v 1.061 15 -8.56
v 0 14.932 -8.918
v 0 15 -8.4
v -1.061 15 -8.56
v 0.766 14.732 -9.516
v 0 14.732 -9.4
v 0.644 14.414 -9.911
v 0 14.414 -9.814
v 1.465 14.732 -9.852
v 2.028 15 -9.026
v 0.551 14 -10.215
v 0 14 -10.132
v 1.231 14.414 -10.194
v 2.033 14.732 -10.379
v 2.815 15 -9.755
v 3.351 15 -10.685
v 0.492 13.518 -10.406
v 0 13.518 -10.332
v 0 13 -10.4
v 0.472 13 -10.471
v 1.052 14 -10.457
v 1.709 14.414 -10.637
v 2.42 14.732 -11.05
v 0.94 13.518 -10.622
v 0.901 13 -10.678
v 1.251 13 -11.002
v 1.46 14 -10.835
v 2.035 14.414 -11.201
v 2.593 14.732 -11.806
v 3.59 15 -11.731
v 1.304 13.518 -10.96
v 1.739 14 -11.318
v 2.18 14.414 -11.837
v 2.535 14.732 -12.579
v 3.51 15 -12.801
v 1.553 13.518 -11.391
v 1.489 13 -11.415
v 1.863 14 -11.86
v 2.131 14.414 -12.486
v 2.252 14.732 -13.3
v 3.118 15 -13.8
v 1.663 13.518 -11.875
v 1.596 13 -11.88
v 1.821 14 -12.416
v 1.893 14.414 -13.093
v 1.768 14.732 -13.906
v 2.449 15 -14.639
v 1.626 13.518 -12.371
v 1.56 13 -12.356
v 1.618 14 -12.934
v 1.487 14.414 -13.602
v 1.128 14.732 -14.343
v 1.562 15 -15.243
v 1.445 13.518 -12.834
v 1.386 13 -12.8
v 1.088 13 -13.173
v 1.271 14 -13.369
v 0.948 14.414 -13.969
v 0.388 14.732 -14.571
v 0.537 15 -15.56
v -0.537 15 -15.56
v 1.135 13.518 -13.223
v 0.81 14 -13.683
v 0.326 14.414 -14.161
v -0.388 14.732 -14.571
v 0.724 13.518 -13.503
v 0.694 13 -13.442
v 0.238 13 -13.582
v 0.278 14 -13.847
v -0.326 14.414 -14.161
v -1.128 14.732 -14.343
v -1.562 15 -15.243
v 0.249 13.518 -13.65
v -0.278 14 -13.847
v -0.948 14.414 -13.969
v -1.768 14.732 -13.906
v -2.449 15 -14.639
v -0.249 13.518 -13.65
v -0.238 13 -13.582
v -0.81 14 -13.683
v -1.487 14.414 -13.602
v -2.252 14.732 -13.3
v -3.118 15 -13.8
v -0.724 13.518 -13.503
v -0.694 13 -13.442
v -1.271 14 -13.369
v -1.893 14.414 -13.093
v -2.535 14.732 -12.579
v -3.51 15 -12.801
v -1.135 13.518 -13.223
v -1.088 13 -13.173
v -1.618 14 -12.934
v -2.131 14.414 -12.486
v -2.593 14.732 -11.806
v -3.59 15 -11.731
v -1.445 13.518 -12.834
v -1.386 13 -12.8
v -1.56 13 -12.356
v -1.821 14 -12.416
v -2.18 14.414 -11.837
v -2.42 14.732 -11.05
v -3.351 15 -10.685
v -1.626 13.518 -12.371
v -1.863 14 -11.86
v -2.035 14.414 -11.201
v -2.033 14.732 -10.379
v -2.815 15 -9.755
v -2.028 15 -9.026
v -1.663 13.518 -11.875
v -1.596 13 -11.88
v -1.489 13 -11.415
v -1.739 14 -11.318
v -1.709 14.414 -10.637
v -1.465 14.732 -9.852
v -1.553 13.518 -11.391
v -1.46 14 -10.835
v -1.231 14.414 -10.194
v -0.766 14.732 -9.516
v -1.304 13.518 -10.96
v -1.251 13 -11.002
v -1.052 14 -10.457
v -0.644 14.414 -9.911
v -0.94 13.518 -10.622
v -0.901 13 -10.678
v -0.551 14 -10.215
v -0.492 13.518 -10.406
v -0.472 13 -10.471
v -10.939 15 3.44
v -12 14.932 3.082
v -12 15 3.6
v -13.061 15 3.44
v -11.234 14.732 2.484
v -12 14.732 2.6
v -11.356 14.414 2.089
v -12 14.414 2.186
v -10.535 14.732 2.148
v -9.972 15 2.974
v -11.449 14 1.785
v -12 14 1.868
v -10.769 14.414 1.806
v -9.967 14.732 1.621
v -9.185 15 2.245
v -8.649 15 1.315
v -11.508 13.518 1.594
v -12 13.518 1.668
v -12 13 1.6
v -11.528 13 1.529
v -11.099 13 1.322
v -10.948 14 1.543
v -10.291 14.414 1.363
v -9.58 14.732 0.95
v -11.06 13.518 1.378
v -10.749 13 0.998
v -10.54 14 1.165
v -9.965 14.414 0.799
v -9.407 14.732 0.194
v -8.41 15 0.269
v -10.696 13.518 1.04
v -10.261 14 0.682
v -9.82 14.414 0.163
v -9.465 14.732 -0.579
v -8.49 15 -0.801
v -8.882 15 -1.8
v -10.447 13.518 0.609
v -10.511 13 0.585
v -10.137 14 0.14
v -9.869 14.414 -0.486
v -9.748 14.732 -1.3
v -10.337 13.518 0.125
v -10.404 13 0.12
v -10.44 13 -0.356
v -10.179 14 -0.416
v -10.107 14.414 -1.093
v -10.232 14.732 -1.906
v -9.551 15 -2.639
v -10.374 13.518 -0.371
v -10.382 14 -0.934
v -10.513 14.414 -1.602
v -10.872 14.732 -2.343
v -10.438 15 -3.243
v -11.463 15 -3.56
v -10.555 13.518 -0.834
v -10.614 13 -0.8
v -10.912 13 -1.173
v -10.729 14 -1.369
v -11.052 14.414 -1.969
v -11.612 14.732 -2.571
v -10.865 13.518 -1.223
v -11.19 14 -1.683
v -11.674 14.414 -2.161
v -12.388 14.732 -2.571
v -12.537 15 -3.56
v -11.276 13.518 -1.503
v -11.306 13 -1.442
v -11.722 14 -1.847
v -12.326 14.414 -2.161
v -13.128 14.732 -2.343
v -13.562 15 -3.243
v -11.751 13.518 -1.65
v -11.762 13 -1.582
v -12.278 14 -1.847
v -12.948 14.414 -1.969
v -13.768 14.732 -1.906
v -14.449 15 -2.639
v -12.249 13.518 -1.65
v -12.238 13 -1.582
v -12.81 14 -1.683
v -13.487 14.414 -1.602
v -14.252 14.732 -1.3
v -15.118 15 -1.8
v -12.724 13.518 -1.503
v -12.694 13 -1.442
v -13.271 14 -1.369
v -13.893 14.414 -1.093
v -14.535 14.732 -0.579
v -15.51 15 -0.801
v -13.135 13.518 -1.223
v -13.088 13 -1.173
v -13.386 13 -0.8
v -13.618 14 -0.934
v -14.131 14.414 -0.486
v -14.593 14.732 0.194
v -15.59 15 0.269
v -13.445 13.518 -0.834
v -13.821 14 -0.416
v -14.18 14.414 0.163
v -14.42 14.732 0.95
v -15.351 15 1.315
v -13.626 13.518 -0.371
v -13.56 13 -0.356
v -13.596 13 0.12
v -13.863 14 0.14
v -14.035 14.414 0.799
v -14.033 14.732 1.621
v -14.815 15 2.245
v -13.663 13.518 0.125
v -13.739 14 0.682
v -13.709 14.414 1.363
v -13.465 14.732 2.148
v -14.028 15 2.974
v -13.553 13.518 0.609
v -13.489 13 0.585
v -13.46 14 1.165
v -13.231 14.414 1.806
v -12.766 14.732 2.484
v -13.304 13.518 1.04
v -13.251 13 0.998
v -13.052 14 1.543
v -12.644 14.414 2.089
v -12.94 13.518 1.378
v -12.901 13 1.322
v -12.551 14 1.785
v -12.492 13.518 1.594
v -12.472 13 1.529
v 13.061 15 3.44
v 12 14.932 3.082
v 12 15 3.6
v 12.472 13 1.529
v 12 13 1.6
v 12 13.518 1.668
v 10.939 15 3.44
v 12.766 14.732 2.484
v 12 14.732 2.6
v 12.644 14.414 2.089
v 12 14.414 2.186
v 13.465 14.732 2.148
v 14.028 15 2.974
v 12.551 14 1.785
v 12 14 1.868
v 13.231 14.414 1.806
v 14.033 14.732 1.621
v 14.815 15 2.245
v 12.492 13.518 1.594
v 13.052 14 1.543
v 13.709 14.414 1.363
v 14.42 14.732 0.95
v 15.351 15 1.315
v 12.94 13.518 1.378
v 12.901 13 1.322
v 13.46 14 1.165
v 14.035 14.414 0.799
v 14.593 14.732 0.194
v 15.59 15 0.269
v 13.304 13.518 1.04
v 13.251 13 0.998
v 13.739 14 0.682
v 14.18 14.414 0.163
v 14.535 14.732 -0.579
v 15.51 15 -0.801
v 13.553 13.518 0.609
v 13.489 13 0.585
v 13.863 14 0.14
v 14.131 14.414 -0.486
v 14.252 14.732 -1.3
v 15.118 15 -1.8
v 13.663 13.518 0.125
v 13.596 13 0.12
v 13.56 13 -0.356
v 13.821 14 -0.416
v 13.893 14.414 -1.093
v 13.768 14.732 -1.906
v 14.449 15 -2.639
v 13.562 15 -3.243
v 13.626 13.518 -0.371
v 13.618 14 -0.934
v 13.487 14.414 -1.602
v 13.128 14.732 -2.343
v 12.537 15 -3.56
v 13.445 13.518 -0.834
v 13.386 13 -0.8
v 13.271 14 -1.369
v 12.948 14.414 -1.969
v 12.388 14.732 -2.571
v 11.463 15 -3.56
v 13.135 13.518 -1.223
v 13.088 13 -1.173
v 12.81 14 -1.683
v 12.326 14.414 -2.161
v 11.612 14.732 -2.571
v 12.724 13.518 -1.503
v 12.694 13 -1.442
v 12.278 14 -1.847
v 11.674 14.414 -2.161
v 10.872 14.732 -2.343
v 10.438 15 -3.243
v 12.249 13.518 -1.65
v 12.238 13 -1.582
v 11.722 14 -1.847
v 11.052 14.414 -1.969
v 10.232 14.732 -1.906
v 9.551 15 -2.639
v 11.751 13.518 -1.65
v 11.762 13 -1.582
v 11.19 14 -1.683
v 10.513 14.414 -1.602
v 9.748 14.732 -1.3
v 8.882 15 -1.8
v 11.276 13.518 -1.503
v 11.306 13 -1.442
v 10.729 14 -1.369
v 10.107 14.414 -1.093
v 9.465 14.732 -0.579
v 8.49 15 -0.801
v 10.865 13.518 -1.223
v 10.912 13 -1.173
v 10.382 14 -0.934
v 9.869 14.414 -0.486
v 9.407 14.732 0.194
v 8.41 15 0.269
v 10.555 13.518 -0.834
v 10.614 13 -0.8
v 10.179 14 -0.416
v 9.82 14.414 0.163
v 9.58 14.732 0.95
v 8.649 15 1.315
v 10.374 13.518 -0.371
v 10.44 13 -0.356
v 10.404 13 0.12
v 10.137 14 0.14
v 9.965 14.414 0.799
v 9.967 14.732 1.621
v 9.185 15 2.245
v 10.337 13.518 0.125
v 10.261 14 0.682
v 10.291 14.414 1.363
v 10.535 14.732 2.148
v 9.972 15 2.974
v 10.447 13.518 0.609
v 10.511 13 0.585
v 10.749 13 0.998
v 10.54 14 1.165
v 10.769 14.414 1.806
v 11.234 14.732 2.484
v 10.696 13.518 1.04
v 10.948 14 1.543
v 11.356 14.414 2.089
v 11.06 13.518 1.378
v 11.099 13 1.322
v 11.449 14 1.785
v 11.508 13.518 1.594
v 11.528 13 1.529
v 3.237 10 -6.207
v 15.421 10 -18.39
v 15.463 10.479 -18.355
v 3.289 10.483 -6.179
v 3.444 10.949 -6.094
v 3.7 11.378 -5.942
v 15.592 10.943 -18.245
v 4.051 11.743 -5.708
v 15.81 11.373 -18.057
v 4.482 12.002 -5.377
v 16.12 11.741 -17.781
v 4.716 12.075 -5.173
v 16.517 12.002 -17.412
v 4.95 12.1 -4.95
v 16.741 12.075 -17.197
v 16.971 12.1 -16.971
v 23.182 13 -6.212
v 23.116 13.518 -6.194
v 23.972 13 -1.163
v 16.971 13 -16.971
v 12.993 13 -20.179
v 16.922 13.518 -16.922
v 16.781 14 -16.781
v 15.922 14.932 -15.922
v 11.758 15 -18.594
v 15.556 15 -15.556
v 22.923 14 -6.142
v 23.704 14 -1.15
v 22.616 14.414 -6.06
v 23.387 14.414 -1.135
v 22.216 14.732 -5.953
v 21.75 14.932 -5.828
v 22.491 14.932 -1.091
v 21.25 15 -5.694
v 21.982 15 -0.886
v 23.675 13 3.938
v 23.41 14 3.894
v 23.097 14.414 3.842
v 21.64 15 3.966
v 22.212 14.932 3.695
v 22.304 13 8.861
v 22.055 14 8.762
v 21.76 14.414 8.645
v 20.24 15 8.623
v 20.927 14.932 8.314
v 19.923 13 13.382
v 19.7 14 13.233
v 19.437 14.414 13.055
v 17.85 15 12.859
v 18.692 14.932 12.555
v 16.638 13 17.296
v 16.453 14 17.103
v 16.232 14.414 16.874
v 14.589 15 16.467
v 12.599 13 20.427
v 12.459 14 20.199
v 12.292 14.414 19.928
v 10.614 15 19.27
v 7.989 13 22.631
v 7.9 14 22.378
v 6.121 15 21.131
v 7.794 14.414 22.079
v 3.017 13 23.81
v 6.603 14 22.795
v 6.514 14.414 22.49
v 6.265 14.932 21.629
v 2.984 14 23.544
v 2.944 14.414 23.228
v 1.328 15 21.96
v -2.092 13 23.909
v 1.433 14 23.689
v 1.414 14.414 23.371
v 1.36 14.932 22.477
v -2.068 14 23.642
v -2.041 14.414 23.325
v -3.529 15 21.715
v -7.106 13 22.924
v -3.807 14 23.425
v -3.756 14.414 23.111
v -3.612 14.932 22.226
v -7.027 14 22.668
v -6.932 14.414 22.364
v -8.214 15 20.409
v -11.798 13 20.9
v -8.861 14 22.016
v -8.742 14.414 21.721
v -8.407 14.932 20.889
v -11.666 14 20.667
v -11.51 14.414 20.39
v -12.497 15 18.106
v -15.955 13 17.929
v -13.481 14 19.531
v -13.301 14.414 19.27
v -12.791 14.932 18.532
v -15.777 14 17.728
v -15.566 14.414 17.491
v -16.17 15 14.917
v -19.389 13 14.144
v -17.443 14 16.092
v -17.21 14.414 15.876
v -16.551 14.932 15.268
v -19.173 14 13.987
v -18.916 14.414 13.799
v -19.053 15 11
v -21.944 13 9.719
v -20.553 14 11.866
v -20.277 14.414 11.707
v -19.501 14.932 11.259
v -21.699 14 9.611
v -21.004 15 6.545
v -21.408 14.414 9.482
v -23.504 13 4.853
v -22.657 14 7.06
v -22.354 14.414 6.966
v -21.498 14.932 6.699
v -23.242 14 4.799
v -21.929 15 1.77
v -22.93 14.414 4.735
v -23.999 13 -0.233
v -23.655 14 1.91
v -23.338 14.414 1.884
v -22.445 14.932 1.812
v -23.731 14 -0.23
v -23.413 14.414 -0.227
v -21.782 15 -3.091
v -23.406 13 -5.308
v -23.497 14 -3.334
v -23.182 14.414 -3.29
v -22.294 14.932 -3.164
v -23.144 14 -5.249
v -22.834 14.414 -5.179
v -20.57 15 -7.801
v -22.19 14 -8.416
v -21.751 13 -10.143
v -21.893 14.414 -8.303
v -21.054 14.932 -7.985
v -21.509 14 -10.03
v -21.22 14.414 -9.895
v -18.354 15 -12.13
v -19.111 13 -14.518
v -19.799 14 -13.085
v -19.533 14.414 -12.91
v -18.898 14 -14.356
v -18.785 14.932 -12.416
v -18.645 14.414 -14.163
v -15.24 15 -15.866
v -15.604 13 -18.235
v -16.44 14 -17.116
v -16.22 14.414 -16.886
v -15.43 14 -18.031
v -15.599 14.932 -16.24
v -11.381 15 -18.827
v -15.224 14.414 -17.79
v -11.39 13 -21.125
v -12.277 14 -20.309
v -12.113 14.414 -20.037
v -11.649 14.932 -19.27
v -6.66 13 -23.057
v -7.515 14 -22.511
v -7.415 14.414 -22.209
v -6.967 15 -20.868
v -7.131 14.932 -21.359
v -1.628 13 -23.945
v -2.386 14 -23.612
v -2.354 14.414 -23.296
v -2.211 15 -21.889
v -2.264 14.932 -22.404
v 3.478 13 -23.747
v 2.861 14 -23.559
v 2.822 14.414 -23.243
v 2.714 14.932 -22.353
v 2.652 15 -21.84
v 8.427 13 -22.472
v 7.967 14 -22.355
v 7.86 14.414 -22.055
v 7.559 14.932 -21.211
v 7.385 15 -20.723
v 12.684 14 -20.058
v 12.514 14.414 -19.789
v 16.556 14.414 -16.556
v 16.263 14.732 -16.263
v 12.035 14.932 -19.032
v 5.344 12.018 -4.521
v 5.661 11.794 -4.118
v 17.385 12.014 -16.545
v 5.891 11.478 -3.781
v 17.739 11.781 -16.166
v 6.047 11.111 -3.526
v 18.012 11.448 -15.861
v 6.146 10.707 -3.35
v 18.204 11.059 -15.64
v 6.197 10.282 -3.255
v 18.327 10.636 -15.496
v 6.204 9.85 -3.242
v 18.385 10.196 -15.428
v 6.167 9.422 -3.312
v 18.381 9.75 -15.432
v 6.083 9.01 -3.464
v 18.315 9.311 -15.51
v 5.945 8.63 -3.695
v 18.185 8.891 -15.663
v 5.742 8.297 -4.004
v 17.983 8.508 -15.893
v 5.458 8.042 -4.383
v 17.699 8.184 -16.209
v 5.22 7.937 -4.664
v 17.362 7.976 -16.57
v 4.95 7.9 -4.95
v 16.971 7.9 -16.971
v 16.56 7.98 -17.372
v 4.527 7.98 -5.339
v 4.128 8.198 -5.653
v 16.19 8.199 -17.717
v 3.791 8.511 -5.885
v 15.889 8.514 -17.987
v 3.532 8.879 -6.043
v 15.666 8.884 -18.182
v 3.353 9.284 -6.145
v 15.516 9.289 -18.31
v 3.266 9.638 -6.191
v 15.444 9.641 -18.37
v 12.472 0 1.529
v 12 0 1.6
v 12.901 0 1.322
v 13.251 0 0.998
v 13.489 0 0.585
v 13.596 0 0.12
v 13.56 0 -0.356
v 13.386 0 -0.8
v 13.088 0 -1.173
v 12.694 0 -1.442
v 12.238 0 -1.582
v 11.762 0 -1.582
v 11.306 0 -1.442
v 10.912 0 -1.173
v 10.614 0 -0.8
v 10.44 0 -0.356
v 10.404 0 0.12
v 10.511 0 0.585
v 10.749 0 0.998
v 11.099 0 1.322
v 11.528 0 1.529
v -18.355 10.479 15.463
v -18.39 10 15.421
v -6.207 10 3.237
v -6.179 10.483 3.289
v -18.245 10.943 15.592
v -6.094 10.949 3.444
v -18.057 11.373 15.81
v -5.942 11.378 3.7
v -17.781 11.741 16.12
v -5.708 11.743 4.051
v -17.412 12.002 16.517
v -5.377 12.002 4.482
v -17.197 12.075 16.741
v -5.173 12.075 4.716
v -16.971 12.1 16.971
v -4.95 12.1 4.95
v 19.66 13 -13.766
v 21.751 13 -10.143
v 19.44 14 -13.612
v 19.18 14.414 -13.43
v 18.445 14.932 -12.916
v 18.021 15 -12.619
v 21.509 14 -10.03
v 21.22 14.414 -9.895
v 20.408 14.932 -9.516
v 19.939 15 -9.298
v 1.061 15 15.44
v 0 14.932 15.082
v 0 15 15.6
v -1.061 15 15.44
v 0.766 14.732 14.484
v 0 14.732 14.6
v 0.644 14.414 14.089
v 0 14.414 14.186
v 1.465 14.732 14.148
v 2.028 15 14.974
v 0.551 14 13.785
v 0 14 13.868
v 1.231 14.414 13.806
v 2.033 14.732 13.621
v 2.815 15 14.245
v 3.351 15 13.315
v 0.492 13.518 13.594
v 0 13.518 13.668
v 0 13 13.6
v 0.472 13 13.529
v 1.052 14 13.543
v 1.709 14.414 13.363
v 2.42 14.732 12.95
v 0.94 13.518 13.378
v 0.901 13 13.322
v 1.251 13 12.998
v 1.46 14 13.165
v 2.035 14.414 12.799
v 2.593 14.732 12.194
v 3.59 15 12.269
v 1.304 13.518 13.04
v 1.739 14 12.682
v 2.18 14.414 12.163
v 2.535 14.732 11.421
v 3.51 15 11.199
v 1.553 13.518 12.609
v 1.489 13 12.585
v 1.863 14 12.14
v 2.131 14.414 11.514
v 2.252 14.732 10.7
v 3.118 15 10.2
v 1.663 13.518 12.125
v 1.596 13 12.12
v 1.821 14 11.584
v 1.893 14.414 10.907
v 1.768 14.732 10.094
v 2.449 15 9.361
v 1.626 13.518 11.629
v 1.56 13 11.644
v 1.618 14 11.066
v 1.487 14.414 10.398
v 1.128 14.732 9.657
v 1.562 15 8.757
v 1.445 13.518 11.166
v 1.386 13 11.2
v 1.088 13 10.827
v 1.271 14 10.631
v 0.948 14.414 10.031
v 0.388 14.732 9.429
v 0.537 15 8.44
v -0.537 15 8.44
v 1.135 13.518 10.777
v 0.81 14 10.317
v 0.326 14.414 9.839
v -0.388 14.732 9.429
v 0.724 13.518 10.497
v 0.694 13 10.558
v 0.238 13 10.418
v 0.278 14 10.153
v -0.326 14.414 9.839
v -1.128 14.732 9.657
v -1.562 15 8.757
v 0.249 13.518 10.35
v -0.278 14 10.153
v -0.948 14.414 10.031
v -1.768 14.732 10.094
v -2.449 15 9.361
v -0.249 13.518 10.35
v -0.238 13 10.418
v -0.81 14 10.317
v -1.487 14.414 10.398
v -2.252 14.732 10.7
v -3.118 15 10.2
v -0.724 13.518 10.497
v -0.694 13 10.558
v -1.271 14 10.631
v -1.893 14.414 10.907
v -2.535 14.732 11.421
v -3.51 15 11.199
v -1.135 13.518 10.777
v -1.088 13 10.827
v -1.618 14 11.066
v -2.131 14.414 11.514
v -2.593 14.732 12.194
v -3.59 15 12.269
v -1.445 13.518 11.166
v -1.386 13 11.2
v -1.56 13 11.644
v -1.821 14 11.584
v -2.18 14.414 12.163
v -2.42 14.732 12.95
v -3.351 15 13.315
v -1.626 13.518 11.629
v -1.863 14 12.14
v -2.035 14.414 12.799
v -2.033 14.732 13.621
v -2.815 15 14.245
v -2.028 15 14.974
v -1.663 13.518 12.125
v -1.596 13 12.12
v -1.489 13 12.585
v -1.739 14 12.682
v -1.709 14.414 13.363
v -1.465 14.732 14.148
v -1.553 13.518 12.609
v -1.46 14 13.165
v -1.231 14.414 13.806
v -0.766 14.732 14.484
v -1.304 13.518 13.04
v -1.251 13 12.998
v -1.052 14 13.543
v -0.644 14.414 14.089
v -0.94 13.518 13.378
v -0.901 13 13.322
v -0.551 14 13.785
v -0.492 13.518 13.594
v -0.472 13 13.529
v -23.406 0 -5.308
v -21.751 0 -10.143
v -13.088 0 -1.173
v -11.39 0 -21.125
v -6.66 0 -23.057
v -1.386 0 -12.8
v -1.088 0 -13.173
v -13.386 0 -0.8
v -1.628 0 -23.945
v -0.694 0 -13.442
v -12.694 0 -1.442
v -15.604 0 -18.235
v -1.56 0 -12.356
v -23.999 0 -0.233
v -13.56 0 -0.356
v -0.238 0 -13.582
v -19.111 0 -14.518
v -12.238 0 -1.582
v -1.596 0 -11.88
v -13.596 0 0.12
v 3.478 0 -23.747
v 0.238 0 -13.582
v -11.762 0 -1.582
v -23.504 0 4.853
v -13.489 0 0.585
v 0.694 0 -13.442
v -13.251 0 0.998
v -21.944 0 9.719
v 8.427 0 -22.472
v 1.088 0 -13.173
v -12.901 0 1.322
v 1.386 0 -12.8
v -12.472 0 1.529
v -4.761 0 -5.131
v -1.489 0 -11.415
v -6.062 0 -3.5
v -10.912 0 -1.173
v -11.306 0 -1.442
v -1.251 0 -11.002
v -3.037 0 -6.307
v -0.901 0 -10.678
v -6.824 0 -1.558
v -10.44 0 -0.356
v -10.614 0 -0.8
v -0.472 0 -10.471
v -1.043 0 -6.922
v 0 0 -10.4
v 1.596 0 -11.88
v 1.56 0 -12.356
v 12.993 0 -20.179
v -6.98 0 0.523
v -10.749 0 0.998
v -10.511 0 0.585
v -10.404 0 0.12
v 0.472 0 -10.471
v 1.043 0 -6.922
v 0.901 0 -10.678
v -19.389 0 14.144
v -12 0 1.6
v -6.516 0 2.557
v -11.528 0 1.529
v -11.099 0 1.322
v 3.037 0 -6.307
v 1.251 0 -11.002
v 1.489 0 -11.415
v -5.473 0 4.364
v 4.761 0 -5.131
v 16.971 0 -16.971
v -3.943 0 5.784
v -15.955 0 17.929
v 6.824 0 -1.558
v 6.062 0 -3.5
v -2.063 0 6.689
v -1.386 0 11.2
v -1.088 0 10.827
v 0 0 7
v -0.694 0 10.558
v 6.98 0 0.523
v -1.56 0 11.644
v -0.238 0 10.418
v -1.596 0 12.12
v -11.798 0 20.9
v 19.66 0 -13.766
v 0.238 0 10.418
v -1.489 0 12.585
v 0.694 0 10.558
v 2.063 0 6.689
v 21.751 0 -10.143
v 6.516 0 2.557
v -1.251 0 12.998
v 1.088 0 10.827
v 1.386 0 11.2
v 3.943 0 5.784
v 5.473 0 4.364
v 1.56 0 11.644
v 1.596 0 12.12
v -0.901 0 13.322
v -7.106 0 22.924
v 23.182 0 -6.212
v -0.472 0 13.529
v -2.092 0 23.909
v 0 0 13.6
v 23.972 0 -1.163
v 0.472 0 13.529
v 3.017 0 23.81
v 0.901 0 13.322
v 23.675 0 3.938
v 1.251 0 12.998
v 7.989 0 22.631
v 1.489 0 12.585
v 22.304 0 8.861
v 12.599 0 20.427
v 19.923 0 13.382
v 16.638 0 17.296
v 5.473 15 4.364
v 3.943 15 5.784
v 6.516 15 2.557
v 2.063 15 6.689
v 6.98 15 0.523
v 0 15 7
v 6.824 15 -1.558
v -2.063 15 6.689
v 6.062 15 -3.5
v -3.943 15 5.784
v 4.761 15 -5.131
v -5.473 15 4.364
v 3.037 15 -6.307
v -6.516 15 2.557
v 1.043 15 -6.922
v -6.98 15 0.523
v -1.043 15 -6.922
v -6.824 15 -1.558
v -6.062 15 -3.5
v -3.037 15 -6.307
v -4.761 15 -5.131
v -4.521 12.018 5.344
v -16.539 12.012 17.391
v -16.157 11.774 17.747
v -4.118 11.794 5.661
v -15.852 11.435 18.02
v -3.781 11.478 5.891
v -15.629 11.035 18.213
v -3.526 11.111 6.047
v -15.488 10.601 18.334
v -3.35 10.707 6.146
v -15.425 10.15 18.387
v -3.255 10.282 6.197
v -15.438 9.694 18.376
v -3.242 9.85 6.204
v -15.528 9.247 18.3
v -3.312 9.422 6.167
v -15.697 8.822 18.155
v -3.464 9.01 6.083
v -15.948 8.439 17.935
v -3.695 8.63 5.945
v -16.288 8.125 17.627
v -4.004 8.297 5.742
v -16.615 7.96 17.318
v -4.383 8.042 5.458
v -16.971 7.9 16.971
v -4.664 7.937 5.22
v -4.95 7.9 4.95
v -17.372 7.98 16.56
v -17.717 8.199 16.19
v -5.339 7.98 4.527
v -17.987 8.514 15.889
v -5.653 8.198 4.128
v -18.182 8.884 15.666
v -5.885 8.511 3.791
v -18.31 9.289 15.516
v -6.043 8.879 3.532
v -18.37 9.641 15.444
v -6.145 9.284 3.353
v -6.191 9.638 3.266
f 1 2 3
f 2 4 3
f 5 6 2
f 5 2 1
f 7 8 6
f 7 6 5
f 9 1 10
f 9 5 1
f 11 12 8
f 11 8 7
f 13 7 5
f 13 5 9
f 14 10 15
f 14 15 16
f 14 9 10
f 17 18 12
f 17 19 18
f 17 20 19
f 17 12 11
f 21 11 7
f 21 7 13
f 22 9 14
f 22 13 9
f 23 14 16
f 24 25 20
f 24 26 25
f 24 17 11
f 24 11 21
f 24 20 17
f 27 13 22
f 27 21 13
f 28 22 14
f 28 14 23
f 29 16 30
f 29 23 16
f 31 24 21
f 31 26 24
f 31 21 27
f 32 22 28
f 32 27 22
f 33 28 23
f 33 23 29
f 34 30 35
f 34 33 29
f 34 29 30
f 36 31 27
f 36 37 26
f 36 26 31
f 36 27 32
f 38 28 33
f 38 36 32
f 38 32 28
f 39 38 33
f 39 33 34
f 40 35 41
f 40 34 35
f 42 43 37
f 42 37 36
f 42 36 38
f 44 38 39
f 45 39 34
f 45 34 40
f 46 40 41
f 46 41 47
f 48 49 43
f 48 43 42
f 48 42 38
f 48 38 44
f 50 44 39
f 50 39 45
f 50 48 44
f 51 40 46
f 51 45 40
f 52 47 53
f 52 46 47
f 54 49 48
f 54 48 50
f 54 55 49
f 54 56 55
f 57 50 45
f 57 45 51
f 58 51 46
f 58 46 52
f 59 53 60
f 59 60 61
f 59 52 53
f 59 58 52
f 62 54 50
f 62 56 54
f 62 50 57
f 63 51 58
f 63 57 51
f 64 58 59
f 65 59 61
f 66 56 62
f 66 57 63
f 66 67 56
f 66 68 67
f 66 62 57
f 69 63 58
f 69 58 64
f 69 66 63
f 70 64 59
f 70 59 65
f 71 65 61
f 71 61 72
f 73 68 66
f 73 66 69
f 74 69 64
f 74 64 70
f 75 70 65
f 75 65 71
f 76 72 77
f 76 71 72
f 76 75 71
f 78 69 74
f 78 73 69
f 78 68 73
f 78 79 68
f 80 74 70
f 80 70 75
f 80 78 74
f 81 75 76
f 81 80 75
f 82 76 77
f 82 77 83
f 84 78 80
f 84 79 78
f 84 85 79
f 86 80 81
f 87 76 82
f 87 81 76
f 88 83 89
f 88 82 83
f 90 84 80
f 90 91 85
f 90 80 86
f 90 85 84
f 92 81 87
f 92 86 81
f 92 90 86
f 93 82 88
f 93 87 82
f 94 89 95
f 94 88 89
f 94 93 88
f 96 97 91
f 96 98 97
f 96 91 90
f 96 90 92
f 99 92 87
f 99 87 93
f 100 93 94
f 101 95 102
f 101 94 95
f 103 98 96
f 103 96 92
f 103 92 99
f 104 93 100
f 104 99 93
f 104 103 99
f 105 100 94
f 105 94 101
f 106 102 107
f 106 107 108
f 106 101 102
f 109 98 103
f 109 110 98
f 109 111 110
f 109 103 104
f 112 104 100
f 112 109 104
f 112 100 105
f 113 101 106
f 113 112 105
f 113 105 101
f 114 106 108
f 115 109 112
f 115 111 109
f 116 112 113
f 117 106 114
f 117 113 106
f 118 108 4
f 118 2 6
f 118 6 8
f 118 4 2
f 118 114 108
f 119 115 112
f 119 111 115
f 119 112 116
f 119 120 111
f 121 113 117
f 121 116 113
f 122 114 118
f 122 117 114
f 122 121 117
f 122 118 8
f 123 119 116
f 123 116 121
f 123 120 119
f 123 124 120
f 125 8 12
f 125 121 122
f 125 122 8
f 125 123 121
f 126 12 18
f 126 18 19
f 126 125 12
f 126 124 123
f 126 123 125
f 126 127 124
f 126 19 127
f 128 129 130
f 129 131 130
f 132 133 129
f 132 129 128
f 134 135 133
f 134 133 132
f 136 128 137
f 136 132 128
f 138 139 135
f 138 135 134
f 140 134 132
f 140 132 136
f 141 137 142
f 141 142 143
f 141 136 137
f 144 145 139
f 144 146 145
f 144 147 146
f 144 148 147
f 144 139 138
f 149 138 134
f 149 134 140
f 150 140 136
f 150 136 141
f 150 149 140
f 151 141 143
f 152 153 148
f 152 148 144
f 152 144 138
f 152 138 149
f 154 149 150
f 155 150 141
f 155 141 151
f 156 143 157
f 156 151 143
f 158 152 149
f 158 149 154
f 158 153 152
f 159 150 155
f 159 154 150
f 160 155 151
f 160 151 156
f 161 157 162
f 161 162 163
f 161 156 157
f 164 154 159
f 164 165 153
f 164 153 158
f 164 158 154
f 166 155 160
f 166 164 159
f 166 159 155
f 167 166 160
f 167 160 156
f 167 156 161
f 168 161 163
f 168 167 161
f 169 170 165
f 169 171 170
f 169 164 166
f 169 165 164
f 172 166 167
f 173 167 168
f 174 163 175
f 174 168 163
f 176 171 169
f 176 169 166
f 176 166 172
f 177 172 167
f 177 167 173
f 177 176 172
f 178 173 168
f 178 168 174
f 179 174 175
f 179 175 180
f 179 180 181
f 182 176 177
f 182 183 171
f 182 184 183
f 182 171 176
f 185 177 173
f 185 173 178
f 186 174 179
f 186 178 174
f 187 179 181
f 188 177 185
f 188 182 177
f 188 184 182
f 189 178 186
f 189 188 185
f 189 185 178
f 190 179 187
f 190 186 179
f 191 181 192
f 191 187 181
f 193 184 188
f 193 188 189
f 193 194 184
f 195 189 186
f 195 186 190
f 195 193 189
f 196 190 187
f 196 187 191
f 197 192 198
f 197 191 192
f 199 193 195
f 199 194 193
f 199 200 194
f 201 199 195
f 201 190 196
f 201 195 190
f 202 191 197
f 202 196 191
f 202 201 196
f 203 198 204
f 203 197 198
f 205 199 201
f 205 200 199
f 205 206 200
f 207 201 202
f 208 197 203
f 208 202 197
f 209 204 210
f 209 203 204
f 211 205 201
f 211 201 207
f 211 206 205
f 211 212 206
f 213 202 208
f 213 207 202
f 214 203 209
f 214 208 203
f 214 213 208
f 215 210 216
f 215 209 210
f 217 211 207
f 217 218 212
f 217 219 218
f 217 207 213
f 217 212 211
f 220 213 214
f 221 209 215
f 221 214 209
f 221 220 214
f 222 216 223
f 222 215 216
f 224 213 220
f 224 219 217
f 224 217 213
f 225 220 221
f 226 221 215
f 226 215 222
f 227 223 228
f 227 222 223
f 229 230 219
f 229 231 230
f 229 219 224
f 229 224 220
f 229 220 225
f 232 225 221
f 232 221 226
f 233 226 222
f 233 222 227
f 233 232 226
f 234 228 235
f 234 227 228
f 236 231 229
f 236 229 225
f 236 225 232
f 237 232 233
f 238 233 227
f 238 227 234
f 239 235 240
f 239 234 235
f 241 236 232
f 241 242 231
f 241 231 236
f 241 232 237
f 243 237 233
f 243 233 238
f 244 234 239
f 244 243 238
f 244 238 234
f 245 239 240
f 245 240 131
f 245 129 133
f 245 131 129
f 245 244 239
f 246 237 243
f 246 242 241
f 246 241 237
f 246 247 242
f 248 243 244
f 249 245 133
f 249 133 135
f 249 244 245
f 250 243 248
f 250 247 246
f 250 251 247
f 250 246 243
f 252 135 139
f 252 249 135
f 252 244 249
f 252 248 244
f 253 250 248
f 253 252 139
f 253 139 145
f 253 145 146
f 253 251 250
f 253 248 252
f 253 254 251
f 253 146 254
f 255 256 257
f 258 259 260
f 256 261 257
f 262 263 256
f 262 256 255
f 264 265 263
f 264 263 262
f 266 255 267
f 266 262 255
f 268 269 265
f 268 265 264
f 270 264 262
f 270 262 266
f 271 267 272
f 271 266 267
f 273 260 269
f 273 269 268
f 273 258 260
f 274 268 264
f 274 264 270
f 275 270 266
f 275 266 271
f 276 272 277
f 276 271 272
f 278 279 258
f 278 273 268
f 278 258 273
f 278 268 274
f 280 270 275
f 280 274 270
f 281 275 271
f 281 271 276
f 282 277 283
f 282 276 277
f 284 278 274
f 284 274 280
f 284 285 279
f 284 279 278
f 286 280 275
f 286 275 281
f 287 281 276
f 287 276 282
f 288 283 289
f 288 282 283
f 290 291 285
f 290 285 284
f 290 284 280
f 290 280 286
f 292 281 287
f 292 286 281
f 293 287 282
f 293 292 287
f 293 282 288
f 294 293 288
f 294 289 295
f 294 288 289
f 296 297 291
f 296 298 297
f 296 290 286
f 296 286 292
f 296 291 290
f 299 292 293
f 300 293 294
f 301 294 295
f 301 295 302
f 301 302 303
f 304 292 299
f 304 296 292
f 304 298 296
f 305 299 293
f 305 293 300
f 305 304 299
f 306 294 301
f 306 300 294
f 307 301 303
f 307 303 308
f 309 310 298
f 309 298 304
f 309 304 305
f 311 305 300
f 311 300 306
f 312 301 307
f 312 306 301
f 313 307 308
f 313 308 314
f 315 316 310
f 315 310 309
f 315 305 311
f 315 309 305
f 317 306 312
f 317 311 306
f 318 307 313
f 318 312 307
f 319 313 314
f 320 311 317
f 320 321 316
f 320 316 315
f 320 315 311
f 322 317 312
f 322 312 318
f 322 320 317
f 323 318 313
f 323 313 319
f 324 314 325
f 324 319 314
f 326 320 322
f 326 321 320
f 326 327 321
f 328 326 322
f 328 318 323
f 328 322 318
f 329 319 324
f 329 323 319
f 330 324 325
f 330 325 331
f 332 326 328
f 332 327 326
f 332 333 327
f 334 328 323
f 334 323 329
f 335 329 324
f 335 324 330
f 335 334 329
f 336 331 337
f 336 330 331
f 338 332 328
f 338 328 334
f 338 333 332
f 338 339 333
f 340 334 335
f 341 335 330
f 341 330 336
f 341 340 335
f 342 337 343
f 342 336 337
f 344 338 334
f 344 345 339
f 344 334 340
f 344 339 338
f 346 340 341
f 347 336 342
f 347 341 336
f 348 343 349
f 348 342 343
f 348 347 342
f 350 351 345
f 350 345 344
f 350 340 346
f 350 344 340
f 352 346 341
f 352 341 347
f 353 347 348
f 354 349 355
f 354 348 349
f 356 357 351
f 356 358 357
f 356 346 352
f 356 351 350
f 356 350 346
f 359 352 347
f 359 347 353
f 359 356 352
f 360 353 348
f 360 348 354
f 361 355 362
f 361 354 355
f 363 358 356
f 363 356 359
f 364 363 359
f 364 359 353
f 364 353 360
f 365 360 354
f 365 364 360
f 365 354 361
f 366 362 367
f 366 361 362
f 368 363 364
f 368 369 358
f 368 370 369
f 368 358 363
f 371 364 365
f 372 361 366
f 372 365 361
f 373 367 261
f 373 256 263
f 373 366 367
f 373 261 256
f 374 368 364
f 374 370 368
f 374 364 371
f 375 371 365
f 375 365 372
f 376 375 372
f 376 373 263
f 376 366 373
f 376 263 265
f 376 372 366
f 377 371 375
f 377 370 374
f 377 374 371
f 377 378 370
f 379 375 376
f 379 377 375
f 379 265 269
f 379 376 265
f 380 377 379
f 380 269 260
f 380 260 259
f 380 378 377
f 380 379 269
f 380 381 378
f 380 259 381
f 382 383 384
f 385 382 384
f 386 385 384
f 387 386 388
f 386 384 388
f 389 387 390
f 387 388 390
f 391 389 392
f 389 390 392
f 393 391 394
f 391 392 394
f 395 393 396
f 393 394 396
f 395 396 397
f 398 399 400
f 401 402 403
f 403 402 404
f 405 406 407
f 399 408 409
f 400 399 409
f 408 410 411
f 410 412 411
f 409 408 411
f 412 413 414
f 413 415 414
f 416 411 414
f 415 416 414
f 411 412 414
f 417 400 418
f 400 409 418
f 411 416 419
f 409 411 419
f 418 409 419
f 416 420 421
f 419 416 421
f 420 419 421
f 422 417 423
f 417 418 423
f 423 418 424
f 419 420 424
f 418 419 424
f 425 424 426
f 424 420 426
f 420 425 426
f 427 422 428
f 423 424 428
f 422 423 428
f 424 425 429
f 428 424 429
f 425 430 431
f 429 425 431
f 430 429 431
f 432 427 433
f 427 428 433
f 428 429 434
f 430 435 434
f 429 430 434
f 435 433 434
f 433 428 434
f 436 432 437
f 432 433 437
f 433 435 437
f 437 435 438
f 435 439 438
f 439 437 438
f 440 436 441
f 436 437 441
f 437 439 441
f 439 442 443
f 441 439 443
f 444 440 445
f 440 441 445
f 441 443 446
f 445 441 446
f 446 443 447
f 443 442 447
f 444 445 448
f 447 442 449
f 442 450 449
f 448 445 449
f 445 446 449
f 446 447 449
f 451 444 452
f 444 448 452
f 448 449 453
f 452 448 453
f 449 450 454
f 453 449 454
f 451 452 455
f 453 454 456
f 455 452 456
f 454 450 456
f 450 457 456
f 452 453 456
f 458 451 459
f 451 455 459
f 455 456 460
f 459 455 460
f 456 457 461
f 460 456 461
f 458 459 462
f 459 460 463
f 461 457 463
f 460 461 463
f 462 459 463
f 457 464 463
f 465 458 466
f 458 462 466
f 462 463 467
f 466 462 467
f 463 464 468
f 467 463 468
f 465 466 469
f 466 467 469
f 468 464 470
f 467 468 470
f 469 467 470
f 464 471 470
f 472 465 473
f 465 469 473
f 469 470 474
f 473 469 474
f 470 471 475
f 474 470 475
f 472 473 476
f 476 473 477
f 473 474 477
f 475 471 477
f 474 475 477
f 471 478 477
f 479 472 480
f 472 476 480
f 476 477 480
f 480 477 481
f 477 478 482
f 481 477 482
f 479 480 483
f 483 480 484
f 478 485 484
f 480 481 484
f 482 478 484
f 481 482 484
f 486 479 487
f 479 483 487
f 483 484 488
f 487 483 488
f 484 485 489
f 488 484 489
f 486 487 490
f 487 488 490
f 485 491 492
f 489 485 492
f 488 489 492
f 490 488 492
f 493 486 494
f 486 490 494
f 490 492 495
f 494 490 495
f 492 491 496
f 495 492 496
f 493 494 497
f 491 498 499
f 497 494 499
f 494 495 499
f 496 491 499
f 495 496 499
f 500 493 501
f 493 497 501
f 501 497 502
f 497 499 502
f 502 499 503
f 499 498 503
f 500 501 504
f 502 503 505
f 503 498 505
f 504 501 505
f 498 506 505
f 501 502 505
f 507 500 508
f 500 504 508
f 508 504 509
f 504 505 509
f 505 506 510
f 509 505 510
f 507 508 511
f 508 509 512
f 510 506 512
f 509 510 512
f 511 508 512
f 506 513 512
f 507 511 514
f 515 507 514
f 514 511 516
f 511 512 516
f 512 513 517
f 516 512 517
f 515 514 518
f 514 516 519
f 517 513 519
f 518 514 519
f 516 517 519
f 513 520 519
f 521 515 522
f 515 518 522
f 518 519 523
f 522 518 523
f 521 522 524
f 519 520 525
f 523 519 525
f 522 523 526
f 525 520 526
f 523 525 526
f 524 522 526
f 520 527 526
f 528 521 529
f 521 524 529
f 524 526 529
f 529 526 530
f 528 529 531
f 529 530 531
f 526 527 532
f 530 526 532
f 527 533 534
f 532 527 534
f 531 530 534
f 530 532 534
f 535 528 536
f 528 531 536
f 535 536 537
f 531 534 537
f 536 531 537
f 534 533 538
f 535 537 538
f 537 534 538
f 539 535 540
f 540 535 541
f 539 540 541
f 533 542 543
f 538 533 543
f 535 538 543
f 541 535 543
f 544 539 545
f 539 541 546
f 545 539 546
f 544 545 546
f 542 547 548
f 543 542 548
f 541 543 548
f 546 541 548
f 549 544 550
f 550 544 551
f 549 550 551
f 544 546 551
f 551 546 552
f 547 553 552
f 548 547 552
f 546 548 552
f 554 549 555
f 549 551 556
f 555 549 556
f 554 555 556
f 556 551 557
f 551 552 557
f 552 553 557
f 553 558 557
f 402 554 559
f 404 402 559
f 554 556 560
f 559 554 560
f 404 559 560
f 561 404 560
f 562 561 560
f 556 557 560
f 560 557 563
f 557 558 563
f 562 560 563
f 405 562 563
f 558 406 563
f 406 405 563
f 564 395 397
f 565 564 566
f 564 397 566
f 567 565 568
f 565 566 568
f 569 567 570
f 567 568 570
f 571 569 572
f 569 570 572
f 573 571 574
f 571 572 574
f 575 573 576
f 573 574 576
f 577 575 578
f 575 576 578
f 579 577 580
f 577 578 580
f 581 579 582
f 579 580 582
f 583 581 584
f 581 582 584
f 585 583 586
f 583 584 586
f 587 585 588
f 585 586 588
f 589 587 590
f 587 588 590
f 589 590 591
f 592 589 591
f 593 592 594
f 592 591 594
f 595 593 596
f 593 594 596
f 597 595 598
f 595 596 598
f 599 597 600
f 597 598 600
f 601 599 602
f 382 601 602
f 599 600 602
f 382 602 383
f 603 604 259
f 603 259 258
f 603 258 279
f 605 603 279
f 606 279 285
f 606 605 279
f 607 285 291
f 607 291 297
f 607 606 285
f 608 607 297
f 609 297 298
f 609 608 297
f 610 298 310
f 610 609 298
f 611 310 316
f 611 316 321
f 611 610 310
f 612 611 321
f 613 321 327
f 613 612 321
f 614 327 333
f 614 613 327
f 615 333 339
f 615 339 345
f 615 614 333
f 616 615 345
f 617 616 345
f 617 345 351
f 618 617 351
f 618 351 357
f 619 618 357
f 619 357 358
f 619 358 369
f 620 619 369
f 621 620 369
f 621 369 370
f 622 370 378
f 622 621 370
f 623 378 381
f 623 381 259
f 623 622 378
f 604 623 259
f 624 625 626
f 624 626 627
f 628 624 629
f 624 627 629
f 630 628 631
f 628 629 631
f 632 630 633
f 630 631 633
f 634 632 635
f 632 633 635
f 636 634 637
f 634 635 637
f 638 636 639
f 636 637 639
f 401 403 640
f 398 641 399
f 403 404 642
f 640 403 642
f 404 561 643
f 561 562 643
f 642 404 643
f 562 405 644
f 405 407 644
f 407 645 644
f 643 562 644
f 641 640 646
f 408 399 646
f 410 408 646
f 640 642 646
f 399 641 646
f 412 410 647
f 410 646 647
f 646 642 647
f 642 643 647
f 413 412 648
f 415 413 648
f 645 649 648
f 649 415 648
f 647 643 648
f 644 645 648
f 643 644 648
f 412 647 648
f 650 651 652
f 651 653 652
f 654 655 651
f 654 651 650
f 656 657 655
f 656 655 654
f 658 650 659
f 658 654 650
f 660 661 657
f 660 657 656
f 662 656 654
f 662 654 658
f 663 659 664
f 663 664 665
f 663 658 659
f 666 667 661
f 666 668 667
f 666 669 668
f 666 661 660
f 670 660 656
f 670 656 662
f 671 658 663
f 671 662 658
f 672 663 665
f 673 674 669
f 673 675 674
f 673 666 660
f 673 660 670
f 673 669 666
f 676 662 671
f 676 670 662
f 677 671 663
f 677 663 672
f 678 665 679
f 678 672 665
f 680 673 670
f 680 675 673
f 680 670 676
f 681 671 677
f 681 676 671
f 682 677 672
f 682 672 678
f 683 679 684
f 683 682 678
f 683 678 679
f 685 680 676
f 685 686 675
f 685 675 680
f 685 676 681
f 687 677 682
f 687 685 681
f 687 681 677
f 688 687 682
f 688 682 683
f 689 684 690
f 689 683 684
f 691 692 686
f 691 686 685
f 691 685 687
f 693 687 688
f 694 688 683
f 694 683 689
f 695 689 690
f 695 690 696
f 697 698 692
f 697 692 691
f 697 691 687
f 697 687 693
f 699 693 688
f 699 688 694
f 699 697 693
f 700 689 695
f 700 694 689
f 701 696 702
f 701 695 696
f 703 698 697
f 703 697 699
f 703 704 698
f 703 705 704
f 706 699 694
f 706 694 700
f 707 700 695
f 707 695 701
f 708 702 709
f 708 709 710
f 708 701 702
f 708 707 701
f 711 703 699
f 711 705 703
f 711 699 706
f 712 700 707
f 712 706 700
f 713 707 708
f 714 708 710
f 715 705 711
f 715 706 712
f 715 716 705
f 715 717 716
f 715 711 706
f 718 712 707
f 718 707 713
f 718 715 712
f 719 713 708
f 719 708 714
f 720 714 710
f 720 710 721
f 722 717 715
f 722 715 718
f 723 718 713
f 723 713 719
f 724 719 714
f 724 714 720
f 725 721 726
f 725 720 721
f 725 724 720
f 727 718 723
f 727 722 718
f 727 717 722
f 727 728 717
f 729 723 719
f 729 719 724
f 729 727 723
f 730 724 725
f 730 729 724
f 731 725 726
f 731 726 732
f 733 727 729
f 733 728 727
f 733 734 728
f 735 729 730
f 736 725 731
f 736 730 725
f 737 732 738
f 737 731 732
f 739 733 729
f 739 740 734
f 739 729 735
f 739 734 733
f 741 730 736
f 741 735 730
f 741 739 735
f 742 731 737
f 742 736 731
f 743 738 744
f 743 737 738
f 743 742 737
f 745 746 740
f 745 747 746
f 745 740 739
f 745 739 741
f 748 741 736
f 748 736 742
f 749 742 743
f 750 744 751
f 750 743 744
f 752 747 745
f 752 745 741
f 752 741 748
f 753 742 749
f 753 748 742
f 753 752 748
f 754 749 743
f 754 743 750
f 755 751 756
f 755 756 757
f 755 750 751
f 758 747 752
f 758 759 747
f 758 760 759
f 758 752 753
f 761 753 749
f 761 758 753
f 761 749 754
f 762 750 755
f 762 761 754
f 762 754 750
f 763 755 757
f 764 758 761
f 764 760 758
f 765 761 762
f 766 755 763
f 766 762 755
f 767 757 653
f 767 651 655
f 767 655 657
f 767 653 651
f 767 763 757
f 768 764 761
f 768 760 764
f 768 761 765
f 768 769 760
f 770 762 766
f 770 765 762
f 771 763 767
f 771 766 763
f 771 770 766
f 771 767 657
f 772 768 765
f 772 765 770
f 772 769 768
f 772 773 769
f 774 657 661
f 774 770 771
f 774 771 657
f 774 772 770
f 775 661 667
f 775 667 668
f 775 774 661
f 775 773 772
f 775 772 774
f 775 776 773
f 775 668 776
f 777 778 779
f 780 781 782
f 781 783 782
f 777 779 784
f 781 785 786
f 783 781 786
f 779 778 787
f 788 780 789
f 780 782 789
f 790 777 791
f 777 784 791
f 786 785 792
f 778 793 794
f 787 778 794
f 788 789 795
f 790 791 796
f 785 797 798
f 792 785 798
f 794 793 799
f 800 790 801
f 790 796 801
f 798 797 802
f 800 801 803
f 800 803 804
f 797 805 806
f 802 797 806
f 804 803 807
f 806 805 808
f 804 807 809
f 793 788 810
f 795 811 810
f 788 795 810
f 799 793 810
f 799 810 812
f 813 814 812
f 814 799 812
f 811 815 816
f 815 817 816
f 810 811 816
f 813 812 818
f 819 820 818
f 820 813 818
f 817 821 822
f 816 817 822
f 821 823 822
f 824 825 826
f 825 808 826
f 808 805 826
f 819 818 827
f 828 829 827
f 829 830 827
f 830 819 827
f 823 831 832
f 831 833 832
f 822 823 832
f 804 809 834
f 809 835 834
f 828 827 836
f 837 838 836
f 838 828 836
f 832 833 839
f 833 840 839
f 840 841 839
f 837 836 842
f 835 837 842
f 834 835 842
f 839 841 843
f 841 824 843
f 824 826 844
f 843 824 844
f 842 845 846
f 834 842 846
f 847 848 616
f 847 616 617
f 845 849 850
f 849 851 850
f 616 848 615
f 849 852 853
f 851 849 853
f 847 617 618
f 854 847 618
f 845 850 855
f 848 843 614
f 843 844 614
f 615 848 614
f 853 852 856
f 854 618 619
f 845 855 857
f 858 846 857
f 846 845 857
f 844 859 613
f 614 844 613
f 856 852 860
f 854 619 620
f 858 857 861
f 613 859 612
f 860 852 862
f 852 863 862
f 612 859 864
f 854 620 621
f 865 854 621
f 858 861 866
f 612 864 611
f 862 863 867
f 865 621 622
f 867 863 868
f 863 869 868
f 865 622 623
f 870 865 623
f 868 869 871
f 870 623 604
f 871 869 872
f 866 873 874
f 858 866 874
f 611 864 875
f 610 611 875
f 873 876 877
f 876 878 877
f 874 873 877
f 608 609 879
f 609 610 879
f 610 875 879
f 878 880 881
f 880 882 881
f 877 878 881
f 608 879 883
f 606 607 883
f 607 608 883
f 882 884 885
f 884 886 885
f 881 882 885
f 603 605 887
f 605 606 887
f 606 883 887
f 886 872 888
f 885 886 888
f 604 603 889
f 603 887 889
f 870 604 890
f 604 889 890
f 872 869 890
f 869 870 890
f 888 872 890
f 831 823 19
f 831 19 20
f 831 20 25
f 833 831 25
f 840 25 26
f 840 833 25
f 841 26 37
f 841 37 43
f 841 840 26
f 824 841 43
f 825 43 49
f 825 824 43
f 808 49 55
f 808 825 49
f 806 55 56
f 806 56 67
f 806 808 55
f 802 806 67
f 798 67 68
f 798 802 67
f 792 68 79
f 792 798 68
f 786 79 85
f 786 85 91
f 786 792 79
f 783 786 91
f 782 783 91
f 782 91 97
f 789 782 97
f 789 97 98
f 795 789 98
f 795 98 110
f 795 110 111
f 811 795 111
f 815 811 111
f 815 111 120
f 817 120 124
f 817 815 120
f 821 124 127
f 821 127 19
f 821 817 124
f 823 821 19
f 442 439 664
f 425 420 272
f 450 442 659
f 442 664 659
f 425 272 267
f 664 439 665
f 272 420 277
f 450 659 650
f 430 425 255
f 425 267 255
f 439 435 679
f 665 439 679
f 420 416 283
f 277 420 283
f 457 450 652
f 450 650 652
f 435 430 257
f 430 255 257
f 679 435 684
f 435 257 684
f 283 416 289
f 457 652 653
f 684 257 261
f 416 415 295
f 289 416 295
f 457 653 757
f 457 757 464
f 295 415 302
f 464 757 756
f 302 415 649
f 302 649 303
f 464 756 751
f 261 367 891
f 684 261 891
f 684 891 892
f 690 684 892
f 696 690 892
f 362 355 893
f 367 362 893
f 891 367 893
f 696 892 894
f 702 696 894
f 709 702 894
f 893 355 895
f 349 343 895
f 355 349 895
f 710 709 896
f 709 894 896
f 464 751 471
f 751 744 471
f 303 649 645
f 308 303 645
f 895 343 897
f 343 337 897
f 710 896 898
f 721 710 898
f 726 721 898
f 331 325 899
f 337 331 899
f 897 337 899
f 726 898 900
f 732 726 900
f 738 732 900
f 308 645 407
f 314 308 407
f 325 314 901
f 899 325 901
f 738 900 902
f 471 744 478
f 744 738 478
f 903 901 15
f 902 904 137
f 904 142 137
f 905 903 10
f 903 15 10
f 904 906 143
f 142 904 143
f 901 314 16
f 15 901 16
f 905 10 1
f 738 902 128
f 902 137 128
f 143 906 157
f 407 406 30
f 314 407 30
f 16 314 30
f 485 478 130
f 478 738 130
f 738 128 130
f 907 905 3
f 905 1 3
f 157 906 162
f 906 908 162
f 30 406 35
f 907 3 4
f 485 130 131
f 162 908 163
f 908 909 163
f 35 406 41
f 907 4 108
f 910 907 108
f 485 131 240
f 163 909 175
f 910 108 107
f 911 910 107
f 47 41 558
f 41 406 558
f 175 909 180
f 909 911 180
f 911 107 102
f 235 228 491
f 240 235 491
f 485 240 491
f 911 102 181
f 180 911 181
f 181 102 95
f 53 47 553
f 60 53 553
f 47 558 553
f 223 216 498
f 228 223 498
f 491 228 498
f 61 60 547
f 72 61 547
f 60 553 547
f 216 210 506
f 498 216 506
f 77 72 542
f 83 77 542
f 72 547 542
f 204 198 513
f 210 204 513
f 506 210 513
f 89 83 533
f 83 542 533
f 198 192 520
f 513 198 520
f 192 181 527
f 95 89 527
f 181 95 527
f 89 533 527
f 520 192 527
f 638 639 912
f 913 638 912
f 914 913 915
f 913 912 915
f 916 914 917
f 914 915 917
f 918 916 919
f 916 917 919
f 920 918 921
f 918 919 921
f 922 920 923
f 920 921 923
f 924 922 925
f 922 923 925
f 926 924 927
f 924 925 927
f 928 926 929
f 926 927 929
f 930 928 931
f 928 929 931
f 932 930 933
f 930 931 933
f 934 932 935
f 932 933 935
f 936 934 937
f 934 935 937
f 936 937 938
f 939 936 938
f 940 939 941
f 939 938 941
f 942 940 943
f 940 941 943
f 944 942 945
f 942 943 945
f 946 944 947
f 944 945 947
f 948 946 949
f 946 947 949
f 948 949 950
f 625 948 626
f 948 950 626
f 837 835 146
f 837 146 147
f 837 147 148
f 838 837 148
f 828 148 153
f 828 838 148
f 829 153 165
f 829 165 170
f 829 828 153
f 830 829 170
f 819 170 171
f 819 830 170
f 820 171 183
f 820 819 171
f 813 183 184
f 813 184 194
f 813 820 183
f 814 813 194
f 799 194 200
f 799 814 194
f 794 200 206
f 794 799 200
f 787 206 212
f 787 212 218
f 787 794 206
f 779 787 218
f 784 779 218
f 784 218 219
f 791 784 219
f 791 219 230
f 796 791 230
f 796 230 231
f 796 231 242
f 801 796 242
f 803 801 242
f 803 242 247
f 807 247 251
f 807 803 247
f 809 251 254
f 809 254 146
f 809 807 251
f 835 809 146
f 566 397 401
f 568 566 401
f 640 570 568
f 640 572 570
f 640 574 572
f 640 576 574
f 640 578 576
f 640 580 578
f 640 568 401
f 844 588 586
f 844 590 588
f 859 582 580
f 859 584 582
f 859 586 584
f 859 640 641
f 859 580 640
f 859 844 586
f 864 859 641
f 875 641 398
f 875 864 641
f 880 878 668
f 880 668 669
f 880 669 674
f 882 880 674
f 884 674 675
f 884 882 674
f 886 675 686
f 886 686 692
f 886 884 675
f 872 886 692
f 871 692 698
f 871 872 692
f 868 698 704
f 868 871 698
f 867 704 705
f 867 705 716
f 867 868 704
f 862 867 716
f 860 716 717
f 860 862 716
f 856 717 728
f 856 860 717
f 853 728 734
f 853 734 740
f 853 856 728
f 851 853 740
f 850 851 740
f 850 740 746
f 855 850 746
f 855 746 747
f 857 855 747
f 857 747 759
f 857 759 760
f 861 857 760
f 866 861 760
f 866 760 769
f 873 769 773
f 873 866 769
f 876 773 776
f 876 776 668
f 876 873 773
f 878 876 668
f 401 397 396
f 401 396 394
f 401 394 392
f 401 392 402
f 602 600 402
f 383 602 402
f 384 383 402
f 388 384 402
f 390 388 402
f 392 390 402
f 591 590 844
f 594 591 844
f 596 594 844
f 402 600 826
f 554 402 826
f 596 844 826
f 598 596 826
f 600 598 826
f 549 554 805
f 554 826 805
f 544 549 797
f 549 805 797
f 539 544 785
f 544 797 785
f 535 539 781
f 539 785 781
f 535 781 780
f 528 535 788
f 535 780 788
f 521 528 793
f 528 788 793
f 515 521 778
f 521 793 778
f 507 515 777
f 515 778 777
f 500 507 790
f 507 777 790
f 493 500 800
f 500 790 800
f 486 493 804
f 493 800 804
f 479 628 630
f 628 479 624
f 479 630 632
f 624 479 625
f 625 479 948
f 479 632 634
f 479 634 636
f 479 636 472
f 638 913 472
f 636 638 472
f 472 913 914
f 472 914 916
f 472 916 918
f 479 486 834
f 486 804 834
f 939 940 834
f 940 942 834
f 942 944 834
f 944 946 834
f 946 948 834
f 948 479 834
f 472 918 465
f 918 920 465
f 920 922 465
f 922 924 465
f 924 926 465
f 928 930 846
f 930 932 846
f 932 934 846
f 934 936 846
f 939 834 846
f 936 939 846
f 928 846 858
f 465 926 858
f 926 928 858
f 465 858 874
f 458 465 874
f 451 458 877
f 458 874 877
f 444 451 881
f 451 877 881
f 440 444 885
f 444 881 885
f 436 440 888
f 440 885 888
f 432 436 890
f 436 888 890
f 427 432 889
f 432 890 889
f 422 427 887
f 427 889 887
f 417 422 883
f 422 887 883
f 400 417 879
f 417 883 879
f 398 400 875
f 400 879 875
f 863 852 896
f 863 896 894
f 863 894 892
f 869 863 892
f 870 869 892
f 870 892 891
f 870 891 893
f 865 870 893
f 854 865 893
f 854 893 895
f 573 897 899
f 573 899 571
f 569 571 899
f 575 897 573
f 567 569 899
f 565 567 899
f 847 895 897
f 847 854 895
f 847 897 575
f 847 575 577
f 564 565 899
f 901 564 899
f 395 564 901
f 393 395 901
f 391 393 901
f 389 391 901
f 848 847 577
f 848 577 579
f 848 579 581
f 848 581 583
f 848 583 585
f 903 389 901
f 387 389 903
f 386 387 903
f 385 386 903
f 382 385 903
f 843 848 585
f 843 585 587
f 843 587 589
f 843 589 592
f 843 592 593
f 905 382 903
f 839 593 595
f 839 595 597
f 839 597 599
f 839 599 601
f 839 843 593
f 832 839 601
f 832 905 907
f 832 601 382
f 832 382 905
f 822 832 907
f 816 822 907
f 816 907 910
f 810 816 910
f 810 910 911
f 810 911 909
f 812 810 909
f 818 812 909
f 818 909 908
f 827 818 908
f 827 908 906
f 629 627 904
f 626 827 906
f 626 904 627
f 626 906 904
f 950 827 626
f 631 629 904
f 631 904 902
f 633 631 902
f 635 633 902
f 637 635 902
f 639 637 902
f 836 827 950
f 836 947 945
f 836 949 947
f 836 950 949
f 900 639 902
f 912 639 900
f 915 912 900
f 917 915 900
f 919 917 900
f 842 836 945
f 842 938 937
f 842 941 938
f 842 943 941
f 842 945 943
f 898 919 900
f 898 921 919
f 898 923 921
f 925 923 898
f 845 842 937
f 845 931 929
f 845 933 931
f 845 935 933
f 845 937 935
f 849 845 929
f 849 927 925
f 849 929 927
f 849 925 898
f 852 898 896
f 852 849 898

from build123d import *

# Parameters (mm, degrees)
SKETCH1_R           = 24
SKETCH1_R_2         = 7
SKETCH1_R_3         = 1.6
BOSS_EXTRUDE1_DEPTH = 15
BOSS_EXTRUDE2_START = -16
BOSS_EXTRUDE2_DEPTH = 16
CUT_EXTRUDE1_DEPTH  = 72
CUT_EXTRUDE2_START  = -72
CUT_EXTRUDE2_DEPTH  = 72
FILLET3_R           = 2


with BuildPart() as part:
    # Sketch1 → Boss-Extrude1 (new body)
    with BuildSketch(Plane(origin=(0, 0, 0), x_dir=(1, 0, 0), z_dir=(0, 1, 0))):
        with Locations(Location((0, 0, 0), (0, 0, 270))):
            Circle(SKETCH1_R)
        with Locations(Location((0, 0, 0), (0, 0, 270))):
            Circle(SKETCH1_R_2, mode=Mode.SUBTRACT)
        with Locations(Location((0, 12, 0), (0, 0, 270))):
            Circle(SKETCH1_R_3, mode=Mode.SUBTRACT)
        with Locations(Location((12, 0, 0), (0, 0, 270))):
            Circle(SKETCH1_R_3, mode=Mode.SUBTRACT)
        with Locations(Location((0, -12, 0), (0, 0, 270))):
            Circle(SKETCH1_R_3, mode=Mode.SUBTRACT)
        with Locations(Location((-12, 0, 0), (0, 0, 270))):
            Circle(SKETCH1_R_3, mode=Mode.SUBTRACT)
    extrude(amount=BOSS_EXTRUDE1_DEPTH)

    # Sketch3 → Boss-Extrude2 (add)
    with BuildSketch(Plane(origin=(0, 15, 0), x_dir=(1, 0, 0), z_dir=(0, 1, 0)).offset(BOSS_EXTRUDE2_START)):
        with BuildLine():
            Line((16.970562748, 16.970562748), (25.455844123, 8.485281374))
            Line((25.455844123, 8.485281374), (23.182219831, 6.211657082))
            ThreePointArc((23.182219831, 6.211657082), (20.784609691, 12), (16.970562748, 16.970562748))
        make_face()
    extrude(amount=BOSS_EXTRUDE2_DEPTH)

    # Sketch4 → Cut-Extrude1 (cut)
    with BuildSketch(Plane(origin=(16.970562748, 0, -16.970562748), x_dir=(-0.7071067811865489, 0, -0.7071067811865461), z_dir=(0.7071067811865461, 0, -0.7071067811865489))):
        with BuildLine():
            ThreePointArc((0, 12.1), (-2.1, 10), (0, 7.9))
            Line((0, 7.9), (0, 10))
            Line((0, 10), (0, 12.1))
        make_face()
        with BuildLine():
            Line((0, 10), (0, 7.9))
            ThreePointArc((0, 7.9), (1.48492424, 8.51507576), (2.1, 10))
            ThreePointArc((2.1, 10), (1.48492424, 11.48492424), (0, 12.1))
            Line((0, 12.1), (0, 10))
        make_face()
    extrude(amount=-CUT_EXTRUDE1_DEPTH, mode=Mode.SUBTRACT)

    # Sketch5 → Cut-Extrude2 (cut)
    with BuildSketch(Plane(origin=(0, 15, 0), x_dir=(1, 0, 0), z_dir=(0, 1, 0)).offset(CUT_EXTRUDE2_START)):
        with BuildLine():
            Line((23.182219831, 6.211657082), (25.455844123, 8.485281374))
            Line((25.455844123, 8.485281374), (16.970562748, 16.970562748))
            ThreePointArc((16.970562748, 16.970562748), (20.784609691, 12), (23.182219831, 6.211657082))
        make_face()
    extrude(amount=CUT_EXTRUDE2_DEPTH, mode=Mode.SUBTRACT)

    # Fillet3
    fillet3_edges = [part.edges().sort_by_distance(p)[0] for p in [
        (12, 15, -1.6),
        (0, 15, 10.4),
        (-12, 15, -1.6),
        (-20.784609691, 15, 12),
        (0, 15, -13.6),
    ]]
    fillet(fillet3_edges, radius=FILLET3_R)


solid = part.part
